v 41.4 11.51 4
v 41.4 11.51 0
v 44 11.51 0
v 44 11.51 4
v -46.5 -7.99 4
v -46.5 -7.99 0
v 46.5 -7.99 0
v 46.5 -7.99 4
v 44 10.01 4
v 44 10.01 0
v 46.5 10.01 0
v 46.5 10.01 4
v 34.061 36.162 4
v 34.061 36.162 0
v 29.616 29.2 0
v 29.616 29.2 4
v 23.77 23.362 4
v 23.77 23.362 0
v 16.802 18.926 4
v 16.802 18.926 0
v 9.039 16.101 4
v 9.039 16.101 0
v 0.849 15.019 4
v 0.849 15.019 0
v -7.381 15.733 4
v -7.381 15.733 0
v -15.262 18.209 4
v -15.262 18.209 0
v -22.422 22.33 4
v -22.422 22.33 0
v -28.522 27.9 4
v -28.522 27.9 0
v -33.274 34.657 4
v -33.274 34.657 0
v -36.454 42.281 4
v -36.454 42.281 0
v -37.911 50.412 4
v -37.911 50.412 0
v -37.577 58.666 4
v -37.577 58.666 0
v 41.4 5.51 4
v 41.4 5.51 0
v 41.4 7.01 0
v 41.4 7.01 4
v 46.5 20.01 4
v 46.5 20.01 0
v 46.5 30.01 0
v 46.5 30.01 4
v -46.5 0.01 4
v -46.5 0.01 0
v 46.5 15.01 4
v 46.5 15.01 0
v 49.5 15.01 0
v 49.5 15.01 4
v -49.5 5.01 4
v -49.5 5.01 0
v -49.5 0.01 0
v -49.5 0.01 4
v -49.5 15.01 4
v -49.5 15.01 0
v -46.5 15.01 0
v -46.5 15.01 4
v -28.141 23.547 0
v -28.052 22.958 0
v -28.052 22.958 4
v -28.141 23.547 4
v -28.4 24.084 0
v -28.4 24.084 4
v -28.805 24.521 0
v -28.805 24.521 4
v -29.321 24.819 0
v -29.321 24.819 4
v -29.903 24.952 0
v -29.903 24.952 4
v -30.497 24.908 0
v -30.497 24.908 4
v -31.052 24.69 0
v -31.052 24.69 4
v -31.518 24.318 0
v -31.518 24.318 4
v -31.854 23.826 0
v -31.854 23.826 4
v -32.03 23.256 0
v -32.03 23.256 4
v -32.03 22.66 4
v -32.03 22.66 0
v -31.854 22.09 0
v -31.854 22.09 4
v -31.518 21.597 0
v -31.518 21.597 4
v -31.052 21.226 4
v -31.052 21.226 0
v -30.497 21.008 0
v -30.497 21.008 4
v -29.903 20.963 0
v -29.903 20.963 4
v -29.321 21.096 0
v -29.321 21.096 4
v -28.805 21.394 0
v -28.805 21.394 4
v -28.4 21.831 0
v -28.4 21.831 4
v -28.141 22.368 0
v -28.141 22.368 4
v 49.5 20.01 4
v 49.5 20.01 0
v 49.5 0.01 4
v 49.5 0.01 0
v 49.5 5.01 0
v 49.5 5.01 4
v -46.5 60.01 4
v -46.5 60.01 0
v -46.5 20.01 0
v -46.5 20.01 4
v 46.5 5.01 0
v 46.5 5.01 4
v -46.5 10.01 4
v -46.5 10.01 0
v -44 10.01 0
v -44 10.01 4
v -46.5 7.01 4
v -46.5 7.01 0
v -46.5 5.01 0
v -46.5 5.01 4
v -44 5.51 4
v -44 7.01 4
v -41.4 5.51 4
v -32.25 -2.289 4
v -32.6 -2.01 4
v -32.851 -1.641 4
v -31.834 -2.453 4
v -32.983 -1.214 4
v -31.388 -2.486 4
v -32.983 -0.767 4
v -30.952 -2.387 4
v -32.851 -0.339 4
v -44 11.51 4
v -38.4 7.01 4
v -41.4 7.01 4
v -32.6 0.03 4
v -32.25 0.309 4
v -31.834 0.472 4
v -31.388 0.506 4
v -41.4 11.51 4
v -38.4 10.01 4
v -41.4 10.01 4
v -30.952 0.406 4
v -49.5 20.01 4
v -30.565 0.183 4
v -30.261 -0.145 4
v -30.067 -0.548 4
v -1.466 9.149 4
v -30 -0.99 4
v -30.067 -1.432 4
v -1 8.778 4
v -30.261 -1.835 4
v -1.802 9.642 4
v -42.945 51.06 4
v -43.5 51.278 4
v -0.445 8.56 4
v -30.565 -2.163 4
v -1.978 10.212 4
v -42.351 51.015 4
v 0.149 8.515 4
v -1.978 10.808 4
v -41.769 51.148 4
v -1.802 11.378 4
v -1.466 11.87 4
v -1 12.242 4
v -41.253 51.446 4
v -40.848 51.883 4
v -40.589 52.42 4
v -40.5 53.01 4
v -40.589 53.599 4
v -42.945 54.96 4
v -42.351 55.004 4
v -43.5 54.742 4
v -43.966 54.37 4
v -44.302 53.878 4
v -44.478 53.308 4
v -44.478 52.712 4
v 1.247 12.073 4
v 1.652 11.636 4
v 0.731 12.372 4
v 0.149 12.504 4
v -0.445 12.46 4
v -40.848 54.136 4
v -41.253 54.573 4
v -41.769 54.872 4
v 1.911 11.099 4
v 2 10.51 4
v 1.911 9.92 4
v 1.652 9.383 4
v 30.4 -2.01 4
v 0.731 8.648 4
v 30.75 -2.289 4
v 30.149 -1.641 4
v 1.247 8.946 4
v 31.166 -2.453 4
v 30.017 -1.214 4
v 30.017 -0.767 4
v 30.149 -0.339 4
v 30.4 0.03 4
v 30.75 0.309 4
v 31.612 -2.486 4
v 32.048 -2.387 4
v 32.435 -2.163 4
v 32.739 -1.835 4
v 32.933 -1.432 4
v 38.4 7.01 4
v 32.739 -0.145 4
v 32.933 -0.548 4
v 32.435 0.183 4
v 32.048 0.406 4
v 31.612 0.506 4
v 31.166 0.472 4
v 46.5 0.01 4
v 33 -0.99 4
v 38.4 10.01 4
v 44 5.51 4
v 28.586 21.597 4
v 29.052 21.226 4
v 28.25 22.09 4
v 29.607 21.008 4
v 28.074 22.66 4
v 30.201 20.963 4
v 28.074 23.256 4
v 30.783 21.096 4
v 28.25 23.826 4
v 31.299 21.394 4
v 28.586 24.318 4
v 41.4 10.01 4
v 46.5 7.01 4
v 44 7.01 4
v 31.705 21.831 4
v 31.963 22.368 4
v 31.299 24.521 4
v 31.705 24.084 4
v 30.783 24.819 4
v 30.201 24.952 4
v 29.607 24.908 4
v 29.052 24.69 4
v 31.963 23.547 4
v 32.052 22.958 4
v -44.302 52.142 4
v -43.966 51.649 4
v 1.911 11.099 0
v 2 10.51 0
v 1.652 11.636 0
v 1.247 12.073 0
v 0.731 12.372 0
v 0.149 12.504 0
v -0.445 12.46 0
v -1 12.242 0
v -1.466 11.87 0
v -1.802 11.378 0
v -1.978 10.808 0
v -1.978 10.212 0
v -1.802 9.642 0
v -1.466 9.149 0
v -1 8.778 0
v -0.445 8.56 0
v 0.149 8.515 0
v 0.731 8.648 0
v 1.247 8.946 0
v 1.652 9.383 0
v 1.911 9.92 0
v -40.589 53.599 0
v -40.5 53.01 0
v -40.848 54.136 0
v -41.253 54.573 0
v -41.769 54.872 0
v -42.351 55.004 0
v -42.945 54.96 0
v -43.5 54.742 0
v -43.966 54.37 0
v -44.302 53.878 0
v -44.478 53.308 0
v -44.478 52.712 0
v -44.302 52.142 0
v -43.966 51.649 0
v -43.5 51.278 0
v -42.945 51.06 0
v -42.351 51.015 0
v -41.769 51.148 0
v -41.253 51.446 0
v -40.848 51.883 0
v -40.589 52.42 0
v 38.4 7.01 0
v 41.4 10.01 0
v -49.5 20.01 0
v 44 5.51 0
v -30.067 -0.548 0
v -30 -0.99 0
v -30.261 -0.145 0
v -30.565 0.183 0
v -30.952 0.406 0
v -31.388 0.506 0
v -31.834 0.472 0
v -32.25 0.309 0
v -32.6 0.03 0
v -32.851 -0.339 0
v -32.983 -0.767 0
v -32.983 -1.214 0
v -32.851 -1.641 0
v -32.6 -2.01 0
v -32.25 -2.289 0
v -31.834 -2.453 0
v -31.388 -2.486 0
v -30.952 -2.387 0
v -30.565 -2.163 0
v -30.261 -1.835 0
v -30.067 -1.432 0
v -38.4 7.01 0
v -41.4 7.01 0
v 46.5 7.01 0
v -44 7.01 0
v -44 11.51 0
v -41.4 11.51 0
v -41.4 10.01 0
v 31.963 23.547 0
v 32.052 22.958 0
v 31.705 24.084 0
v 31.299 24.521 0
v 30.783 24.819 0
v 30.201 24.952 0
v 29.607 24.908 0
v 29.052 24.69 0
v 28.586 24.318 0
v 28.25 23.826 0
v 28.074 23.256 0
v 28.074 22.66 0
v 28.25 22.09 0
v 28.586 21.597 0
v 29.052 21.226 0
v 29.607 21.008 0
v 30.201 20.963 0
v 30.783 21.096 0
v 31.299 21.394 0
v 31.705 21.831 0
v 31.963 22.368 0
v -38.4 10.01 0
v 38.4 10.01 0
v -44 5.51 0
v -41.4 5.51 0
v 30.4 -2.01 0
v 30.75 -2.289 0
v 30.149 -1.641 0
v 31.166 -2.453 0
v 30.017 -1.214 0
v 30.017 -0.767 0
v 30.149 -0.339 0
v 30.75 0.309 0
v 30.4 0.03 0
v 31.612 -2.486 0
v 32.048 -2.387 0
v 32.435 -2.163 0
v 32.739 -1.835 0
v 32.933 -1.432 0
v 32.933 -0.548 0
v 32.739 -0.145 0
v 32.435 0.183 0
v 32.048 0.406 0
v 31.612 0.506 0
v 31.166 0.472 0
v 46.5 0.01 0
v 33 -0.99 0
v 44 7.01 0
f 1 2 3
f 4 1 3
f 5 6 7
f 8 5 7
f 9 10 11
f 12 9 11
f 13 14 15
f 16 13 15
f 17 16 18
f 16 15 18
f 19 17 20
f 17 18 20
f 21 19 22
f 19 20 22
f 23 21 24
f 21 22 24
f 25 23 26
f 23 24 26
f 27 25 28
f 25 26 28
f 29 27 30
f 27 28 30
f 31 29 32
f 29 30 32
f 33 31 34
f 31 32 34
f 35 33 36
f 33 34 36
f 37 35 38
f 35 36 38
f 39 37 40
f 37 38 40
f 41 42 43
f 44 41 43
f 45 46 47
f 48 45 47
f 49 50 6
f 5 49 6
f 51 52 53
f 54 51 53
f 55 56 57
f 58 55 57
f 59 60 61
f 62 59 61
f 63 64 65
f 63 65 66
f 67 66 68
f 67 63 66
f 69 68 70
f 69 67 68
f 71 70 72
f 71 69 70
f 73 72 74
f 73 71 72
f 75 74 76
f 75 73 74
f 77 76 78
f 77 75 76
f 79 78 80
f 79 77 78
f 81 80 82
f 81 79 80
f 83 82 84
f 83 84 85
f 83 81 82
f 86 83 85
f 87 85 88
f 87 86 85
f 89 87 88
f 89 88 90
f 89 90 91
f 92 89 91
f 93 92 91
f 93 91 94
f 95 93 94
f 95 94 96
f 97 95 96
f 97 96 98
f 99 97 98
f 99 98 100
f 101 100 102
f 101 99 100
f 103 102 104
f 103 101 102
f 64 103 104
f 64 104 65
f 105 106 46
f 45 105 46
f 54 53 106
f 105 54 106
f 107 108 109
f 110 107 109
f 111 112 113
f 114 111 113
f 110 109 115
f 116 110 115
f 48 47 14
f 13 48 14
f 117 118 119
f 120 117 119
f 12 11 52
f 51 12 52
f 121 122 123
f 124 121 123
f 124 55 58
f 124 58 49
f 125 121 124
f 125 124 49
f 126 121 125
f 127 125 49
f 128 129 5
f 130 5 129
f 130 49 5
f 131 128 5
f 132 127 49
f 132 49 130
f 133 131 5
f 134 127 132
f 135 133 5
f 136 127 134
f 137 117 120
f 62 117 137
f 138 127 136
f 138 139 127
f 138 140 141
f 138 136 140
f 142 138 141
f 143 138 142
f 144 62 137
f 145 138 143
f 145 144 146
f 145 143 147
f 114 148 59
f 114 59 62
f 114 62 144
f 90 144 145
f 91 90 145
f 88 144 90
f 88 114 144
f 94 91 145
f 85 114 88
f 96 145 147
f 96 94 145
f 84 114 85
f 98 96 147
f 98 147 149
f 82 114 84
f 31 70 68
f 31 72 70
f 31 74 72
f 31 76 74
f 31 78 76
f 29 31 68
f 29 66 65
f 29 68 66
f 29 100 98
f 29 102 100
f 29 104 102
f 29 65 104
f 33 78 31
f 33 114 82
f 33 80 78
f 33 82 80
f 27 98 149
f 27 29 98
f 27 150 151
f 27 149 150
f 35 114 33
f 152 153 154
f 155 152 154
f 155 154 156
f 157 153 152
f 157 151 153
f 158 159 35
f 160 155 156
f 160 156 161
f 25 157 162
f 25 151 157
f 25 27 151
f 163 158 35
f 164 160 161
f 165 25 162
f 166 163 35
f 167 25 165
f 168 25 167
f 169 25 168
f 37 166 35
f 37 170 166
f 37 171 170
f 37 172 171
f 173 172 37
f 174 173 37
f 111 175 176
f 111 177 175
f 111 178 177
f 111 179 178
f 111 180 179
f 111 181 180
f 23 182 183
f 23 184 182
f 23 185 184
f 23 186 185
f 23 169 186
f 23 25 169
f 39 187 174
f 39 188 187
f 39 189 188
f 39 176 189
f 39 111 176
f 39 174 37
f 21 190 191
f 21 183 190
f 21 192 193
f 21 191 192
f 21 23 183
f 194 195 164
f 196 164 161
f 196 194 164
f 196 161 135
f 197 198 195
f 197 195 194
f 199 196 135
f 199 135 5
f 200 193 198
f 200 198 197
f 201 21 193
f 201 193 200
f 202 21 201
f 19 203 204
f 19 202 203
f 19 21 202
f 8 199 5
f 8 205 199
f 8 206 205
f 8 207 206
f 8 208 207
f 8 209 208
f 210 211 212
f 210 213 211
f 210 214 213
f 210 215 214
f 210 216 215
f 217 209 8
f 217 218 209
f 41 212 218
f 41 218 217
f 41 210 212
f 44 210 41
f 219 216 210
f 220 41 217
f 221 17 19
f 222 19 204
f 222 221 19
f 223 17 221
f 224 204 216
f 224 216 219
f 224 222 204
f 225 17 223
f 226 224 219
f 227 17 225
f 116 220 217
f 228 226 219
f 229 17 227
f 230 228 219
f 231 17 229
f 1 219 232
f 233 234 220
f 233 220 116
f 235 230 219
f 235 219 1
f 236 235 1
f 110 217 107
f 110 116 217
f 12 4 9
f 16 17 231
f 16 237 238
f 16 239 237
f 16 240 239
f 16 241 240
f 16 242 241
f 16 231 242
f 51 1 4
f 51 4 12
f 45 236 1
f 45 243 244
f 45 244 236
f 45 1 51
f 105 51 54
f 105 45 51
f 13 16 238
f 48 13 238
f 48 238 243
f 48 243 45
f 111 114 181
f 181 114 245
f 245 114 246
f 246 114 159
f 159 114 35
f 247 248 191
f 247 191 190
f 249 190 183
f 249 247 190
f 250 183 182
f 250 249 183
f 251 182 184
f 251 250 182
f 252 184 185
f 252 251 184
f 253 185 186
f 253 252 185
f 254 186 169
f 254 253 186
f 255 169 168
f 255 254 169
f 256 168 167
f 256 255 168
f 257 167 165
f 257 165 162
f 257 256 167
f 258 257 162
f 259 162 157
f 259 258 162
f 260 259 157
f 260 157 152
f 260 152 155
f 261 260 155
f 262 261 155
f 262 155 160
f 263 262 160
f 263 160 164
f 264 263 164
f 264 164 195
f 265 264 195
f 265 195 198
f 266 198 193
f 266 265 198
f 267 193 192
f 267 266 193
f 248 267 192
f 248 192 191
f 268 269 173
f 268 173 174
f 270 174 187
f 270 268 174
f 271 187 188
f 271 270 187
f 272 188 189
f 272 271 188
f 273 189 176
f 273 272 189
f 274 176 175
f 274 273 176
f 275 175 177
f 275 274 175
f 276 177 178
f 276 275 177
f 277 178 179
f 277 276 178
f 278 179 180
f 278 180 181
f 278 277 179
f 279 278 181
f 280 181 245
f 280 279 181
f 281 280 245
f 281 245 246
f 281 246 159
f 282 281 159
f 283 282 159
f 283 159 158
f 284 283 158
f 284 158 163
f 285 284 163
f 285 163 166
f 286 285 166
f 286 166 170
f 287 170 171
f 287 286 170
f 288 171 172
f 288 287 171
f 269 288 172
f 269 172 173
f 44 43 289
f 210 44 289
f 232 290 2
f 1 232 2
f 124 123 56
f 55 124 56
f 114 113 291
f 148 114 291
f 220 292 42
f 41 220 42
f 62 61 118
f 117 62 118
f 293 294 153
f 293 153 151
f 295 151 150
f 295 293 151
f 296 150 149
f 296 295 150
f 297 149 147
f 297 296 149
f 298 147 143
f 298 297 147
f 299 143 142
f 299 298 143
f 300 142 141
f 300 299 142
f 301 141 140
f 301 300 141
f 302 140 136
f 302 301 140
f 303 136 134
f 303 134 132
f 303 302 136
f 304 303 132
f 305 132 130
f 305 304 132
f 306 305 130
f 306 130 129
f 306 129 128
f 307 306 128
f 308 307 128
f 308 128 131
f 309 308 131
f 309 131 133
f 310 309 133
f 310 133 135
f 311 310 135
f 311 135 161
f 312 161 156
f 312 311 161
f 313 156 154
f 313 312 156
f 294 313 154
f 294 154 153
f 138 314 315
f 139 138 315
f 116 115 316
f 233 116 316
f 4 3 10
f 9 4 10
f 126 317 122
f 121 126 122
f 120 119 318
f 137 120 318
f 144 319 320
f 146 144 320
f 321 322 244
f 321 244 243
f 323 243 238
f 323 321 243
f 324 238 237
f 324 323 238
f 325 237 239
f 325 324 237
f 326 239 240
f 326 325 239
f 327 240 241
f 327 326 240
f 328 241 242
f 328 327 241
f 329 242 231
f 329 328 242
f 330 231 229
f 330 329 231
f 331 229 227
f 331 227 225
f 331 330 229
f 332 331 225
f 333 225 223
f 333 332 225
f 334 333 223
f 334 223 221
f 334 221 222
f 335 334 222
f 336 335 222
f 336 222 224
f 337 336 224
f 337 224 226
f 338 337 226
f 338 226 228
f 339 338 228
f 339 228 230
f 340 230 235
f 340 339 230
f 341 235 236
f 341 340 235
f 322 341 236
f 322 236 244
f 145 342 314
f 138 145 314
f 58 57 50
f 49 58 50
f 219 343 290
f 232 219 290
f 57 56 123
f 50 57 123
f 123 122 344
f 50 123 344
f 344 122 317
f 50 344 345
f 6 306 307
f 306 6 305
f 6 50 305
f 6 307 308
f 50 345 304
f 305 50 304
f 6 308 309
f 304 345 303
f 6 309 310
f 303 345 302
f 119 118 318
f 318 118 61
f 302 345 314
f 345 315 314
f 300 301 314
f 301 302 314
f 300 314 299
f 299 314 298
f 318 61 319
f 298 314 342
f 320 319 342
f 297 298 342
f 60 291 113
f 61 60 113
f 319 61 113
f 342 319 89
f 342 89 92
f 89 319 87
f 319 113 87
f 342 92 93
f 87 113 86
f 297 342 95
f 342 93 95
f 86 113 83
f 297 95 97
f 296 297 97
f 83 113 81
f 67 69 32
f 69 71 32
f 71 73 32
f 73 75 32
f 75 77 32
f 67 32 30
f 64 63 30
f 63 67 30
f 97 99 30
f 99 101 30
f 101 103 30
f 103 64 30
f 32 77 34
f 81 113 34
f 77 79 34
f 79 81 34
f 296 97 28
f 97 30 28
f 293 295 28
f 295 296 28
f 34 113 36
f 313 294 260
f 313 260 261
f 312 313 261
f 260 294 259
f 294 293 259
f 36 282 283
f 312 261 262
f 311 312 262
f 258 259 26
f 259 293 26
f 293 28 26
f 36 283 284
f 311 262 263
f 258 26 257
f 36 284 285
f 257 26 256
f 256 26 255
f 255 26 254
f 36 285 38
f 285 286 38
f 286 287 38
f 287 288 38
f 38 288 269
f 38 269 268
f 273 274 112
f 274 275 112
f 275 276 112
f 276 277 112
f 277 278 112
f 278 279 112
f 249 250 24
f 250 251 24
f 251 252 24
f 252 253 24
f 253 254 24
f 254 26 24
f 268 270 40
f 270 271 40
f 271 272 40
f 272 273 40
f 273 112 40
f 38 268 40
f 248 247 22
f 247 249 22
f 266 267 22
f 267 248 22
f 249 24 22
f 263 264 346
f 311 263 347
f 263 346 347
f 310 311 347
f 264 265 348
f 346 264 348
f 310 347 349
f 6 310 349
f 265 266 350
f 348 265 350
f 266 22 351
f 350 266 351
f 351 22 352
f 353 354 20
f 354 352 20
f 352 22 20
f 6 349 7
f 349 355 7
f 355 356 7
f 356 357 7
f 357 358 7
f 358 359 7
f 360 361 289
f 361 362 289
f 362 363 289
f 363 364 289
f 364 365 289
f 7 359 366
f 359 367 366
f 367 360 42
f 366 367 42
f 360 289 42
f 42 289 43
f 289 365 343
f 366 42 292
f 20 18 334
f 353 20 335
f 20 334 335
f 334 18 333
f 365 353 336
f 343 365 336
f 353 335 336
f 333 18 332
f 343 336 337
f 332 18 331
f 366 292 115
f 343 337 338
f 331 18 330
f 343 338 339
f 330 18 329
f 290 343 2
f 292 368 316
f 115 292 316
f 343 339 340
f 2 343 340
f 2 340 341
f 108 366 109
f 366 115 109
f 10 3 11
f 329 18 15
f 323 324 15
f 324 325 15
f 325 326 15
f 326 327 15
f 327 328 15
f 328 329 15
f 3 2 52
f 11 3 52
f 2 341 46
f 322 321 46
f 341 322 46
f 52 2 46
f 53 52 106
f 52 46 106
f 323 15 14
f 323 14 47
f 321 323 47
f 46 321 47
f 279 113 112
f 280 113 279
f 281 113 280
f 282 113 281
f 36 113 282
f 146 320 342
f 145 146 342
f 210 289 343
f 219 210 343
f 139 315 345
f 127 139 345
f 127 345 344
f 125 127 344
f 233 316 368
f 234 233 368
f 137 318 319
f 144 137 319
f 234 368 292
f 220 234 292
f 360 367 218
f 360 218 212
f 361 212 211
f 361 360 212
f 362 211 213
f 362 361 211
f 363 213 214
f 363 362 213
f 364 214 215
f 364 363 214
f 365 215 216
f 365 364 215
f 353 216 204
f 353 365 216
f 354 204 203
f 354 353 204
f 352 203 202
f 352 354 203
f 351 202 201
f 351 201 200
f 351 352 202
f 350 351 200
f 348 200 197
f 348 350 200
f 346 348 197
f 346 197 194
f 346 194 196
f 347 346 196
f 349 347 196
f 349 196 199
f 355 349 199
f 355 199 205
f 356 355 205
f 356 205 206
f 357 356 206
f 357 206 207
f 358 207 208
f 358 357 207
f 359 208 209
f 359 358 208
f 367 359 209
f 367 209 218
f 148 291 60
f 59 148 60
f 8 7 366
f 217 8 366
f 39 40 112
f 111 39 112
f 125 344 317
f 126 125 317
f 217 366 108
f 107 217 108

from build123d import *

# Parameters (mm, degrees)
SKETCH_3_R      = 1.5
SKETCH_3_R_2    = 2
EXTRUDE_1_DEPTH = 4


with BuildPart() as part:
    # 草图3 → 凸台-拉伸1 (new body)
    with BuildSketch(Plane.XY):
        with BuildLine():
            Line((-46.5, -7.990216685), (46.5, -7.990216685))
            Line((46.5, -7.990216685), (46.5, 0.009783315))
            Line((46.5, 0.009783315), (49.5, 0.009783315))
            Line((49.5, 0.009783315), (49.5, 5.009783315))
            Line((49.5, 5.009783315), (46.5, 5.009783315))
            Line((46.5, 5.009783315), (46.5, 7.009783315))
            Line((46.5, 7.009783315), (44, 7.009783315))
            Line((44, 7.009783315), (44, 5.509783315))
            Line((44, 5.509783315), (41.4, 5.509783315))
            Line((41.4, 5.509783315), (41.4, 7.009783315))
            Line((41.4, 7.009783315), (38.4, 7.009783315))
            Line((38.4, 7.009783315), (38.4, 10.009783315))
            Line((38.4, 10.009783315), (41.4, 10.009783315))
            Line((41.4, 10.009783315), (41.4, 11.509783315))
            Line((41.4, 11.509783315), (44, 11.509783315))
            Line((44, 11.509783315), (44, 10.009783315))
            Line((44, 10.009783315), (46.5, 10.009783315))
            Line((46.5, 10.009783315), (46.5, 15.009783315))
            Line((46.5, 15.009783315), (49.5, 15.009783315))
            Line((49.5, 15.009783315), (49.5, 20.009783315))
            Line((49.5, 20.009783315), (46.5, 20.009783315))
            Line((46.5, 20.009783315), (46.5, 30.009783315))
            Line((46.5, 30.009783315), (34.06116735, 36.162324196))
            ThreePointArc((34.06116735, 36.162324196), (-11.38853896, 16.756491321), (-37.576612526, 58.666477673))
            Line((-37.576612526, 58.666477673), (-46.5, 60.009783315))
            Line((-46.5, 60.009783315), (-46.5, 20.009783315))
            Line((-46.5, 20.009783315), (-49.5, 20.009783315))
            Line((-49.5, 20.009783315), (-49.5, 15.009783315))
            Line((-49.5, 15.009783315), (-46.5, 15.009783315))
            Line((-46.5, 15.009783315), (-46.5, 10.009783315))
            Line((-46.5, 10.009783315), (-44, 10.009783315))
            Line((-44, 10.009783315), (-44, 11.509783315))
            Line((-44, 11.509783315), (-41.4, 11.509783315))
            Line((-41.4, 11.509783315), (-41.4, 10.009783315))
            Line((-41.4, 10.009783315), (-38.4, 10.009783315))
            Line((-38.4, 10.009783315), (-38.4, 7.009783315))
            Line((-38.4, 7.009783315), (-41.4, 7.009783315))
            Line((-41.4, 7.009783315), (-41.4, 5.509783315))
            Line((-41.4, 5.509783315), (-44, 5.509783315))
            Line((-44, 5.509783315), (-44, 7.009783315))
            Line((-44, 7.009783315), (-46.5, 7.009783315))
            Line((-46.5, 7.009783315), (-46.5, 5.009783315))
            Line((-46.5, 5.009783315), (-49.5, 5.009783315))
            Line((-49.5, 5.009783315), (-49.5, 0.009783315))
            Line((-49.5, 0.009783315), (-46.5, 0.009783315))
            Line((-46.5, 0.009783315), (-46.5, -7.990216685))
        make_face()
        with Locations((-31.5, -0.990216685)):
            Circle(SKETCH_3_R, mode=Mode.SUBTRACT)
        with Locations((31.5, -0.990216685)):
            Circle(SKETCH_3_R, mode=Mode.SUBTRACT)
        with Locations((0, 10.509783315)):
            Circle(SKETCH_3_R_2, mode=Mode.SUBTRACT)
        with Locations((-30.0520382, 22.957745114)):
            Circle(SKETCH_3_R_2, mode=Mode.SUBTRACT)
        with Locations((-42.5, 53.009783315)):
            Circle(SKETCH_3_R_2, mode=Mode.SUBTRACT)
        with Locations((30.0520382, 22.957745114)):
            Circle(SKETCH_3_R_2, mode=Mode.SUBTRACT)
    extrude(amount=EXTRUDE_1_DEPTH)


solid = part.part
